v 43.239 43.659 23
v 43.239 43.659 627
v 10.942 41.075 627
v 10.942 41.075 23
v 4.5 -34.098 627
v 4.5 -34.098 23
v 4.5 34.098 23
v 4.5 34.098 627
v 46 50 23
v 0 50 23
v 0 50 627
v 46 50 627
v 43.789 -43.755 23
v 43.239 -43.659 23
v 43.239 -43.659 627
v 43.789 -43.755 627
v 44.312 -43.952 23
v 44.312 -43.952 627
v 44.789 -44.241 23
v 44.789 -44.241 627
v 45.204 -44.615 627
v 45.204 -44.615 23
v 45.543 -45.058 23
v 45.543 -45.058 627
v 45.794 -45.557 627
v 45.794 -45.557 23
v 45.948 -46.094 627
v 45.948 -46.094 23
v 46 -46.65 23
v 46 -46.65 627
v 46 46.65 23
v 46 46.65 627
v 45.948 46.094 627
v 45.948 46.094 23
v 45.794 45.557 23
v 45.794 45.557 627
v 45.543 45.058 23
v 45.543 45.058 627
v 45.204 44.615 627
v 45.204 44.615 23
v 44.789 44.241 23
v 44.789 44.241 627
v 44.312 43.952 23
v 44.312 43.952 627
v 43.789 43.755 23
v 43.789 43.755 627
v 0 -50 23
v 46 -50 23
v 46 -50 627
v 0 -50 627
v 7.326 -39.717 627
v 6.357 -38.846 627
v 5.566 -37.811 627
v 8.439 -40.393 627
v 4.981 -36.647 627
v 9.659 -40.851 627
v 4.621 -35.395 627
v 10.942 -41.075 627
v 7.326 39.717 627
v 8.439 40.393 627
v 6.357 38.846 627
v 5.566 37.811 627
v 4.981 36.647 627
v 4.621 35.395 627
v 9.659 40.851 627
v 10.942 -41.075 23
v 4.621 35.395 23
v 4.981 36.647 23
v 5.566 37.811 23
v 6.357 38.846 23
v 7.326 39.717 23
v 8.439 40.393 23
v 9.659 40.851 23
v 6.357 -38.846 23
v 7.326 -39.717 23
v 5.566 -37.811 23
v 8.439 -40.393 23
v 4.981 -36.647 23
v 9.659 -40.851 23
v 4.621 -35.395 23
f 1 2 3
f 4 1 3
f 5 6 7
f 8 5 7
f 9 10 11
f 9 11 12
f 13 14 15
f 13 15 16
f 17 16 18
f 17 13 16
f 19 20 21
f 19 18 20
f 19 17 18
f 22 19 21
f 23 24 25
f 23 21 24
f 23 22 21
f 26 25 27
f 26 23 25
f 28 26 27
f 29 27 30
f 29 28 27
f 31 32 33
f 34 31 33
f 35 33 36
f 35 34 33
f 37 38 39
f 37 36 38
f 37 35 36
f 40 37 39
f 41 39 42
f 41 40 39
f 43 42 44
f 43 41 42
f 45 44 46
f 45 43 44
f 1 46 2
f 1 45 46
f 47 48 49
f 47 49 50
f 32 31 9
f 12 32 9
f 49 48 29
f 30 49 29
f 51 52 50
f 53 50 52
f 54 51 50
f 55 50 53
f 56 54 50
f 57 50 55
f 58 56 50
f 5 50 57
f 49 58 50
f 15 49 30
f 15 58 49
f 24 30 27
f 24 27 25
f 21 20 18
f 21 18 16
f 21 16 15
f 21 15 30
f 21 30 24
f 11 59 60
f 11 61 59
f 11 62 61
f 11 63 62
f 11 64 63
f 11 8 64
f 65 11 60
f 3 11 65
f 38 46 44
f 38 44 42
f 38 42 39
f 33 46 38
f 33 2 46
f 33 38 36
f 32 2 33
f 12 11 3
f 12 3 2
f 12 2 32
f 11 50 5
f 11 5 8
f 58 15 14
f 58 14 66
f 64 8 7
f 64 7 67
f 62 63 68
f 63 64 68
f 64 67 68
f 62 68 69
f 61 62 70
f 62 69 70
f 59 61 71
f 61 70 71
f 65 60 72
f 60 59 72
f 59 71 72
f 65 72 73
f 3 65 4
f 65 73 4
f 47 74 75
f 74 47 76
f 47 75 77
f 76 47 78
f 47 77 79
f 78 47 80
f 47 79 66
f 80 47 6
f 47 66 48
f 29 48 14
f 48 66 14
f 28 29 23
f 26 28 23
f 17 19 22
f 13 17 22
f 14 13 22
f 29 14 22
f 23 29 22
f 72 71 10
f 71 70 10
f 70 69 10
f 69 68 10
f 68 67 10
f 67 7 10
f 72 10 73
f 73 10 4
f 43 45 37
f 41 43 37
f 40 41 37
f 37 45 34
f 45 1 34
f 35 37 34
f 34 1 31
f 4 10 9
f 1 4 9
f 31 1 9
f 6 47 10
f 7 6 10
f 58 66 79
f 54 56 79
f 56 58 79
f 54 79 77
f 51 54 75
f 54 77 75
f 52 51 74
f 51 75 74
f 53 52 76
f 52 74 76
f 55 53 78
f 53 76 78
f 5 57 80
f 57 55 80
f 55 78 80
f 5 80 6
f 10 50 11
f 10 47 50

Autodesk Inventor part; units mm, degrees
ref_plane "Начальная плоскость" through (0, 0, 23) normal (0, 0, 1) x (1, 0, 0)
ref_plane "Конечная плоскость" through (0, 0, 627) normal (0, 0, 1) x (1, 0, 0)
sketch "Эскиз" plane through (0, 0, 0) normal (0, 0, 1) x (1, 0, 0)
  line L0 (46, -50) -> (0, -50)
  line L1 (46, -50) -> (46, -46.6496)
  line L2 (43.2392, -43.6591) -> (10.9418, -41.0753)
  line L3 (4.5, -34.0976) -> (4.5, 34.0976)
  line L4 (43.2392, 43.6591) -> (10.9418, 41.0753)
  line L5 (46, 46.6496) -> (46, 50)
  line L6 (0, 50) -> (46, 50)
  line L7 (0, -50) -> (0, 50)
  arc A0 (4.5, -34.0976) -> (10.9418, -41.0753) centre (11.5, -34.0976) ccw
  arc A1 (10.9418, 41.0753) -> (4.5, 34.0976) centre (11.5, 34.0976) ccw
  arc A2 (46, -46.6496) -> (43.2392, -43.6591) centre (43, -46.6496) ccw
  arc A3 (43.2392, 43.6591) -> (46, 46.6496) centre (43, 46.6496) ccw
  line L8 (0, 70) -> (0, -70) construction
  line L9 (-9.3169, 0) -> (55.9016, 0) construction
  point P0 (46, -43.88)
  point P1 (4.5, -40.56)
  point P2 (4.5, 40.56)
  point P3 (46, 43.88)
  dimension "d3" = 46
  dimension "d5" = 4.5
  dimension "d7" = 100
  dimension "d9" = 9.44
  dimension "d11" = 9.44
  dimension "d13" = 6.12
  dimension "d15" = 6.12
  dimension "d22" = 7
  dimension "d23" = 3
  dimension "d24" = 50
  dimension "d25" = 0
extrude "Тело" add sketch "Эскиз" along normal up to surface (604 mm away) from surface at 23
sketch "Sketch3" plane through (0, 0, 0) normal (0, 0, 1) x (1, 0, 0)
  line L0 (0, 0) -> (10, 0)
ref_plane "Work Plane7" through (0, 0, 0) normal (0, -1, 0) x (1, 0, 0)
sketch "Sketch4" plane through (0, 0, 0) normal (0, -1, 0) x (1, 0, 0)
  line L0 (-2, 23) -> (12, 23)
  line L1 (-2, 627) -> (12, 627)
  dimension "d29" = 604
ref_plane "РабПлоскость8" through (-227, -50, 23) normal (0, 0, -1) x (-1, 0, 0)
split "Разделение1" plane through (-227, -50, 23) removes the side toward (0, 0, -1)
ref_plane "РабПлоскость9" through (23, -50, 627) normal (0, 0, 1) x (1, 0, 0)
split "Разделение2" plane through (23, -50, 627) removes the side toward (0, 0, 1)
equation "\"d3\" = b"
equation "\"d5\" = t1"
equation "\"d7\" = ParH"
equation "\"d9\" = msp_x1 + t2"
equation "\"d11\" = msp_x1 + t2"
equation "\"d13\" = -msp_x2 + t2"
equation "\"d15\" = -msp_x2 + t2"
equation "\"d22\" = R"
equation "\"d23\" = R1"
equation "\"d24\" = 0.5 * d7"
equation "\"d16\" = G_L"
equation "\"R1\" = 3"
equation "\"R\" = 7"
equation "\"t1\" = 4.5"
equation "\"t2\" = 7.6"
equation "\"ParH\" = 100"
equation "\"b\" = 46"
equation "\"msp_x1\" = 0.04 * b"
equation "\"msp_x2\" = -0.08 * t1 + 0.04 * b"
equation "\"G_L\" = d29"
equation "\"ex\" = 0"
equation "\"G_OFFSET_START\" = -23"
equation "\"G_OFFSET_END\" = -23"
equation "\"d26\" = -G_OFFSET_START"
equation "\"d27\" = G_OFFSET_END + B_L"
equation "\"B_L\" = 650"
properties part number "Швеллер 10U-604 ГОСТ 8240-97" material "Сталь, мягкая, сварочная"
